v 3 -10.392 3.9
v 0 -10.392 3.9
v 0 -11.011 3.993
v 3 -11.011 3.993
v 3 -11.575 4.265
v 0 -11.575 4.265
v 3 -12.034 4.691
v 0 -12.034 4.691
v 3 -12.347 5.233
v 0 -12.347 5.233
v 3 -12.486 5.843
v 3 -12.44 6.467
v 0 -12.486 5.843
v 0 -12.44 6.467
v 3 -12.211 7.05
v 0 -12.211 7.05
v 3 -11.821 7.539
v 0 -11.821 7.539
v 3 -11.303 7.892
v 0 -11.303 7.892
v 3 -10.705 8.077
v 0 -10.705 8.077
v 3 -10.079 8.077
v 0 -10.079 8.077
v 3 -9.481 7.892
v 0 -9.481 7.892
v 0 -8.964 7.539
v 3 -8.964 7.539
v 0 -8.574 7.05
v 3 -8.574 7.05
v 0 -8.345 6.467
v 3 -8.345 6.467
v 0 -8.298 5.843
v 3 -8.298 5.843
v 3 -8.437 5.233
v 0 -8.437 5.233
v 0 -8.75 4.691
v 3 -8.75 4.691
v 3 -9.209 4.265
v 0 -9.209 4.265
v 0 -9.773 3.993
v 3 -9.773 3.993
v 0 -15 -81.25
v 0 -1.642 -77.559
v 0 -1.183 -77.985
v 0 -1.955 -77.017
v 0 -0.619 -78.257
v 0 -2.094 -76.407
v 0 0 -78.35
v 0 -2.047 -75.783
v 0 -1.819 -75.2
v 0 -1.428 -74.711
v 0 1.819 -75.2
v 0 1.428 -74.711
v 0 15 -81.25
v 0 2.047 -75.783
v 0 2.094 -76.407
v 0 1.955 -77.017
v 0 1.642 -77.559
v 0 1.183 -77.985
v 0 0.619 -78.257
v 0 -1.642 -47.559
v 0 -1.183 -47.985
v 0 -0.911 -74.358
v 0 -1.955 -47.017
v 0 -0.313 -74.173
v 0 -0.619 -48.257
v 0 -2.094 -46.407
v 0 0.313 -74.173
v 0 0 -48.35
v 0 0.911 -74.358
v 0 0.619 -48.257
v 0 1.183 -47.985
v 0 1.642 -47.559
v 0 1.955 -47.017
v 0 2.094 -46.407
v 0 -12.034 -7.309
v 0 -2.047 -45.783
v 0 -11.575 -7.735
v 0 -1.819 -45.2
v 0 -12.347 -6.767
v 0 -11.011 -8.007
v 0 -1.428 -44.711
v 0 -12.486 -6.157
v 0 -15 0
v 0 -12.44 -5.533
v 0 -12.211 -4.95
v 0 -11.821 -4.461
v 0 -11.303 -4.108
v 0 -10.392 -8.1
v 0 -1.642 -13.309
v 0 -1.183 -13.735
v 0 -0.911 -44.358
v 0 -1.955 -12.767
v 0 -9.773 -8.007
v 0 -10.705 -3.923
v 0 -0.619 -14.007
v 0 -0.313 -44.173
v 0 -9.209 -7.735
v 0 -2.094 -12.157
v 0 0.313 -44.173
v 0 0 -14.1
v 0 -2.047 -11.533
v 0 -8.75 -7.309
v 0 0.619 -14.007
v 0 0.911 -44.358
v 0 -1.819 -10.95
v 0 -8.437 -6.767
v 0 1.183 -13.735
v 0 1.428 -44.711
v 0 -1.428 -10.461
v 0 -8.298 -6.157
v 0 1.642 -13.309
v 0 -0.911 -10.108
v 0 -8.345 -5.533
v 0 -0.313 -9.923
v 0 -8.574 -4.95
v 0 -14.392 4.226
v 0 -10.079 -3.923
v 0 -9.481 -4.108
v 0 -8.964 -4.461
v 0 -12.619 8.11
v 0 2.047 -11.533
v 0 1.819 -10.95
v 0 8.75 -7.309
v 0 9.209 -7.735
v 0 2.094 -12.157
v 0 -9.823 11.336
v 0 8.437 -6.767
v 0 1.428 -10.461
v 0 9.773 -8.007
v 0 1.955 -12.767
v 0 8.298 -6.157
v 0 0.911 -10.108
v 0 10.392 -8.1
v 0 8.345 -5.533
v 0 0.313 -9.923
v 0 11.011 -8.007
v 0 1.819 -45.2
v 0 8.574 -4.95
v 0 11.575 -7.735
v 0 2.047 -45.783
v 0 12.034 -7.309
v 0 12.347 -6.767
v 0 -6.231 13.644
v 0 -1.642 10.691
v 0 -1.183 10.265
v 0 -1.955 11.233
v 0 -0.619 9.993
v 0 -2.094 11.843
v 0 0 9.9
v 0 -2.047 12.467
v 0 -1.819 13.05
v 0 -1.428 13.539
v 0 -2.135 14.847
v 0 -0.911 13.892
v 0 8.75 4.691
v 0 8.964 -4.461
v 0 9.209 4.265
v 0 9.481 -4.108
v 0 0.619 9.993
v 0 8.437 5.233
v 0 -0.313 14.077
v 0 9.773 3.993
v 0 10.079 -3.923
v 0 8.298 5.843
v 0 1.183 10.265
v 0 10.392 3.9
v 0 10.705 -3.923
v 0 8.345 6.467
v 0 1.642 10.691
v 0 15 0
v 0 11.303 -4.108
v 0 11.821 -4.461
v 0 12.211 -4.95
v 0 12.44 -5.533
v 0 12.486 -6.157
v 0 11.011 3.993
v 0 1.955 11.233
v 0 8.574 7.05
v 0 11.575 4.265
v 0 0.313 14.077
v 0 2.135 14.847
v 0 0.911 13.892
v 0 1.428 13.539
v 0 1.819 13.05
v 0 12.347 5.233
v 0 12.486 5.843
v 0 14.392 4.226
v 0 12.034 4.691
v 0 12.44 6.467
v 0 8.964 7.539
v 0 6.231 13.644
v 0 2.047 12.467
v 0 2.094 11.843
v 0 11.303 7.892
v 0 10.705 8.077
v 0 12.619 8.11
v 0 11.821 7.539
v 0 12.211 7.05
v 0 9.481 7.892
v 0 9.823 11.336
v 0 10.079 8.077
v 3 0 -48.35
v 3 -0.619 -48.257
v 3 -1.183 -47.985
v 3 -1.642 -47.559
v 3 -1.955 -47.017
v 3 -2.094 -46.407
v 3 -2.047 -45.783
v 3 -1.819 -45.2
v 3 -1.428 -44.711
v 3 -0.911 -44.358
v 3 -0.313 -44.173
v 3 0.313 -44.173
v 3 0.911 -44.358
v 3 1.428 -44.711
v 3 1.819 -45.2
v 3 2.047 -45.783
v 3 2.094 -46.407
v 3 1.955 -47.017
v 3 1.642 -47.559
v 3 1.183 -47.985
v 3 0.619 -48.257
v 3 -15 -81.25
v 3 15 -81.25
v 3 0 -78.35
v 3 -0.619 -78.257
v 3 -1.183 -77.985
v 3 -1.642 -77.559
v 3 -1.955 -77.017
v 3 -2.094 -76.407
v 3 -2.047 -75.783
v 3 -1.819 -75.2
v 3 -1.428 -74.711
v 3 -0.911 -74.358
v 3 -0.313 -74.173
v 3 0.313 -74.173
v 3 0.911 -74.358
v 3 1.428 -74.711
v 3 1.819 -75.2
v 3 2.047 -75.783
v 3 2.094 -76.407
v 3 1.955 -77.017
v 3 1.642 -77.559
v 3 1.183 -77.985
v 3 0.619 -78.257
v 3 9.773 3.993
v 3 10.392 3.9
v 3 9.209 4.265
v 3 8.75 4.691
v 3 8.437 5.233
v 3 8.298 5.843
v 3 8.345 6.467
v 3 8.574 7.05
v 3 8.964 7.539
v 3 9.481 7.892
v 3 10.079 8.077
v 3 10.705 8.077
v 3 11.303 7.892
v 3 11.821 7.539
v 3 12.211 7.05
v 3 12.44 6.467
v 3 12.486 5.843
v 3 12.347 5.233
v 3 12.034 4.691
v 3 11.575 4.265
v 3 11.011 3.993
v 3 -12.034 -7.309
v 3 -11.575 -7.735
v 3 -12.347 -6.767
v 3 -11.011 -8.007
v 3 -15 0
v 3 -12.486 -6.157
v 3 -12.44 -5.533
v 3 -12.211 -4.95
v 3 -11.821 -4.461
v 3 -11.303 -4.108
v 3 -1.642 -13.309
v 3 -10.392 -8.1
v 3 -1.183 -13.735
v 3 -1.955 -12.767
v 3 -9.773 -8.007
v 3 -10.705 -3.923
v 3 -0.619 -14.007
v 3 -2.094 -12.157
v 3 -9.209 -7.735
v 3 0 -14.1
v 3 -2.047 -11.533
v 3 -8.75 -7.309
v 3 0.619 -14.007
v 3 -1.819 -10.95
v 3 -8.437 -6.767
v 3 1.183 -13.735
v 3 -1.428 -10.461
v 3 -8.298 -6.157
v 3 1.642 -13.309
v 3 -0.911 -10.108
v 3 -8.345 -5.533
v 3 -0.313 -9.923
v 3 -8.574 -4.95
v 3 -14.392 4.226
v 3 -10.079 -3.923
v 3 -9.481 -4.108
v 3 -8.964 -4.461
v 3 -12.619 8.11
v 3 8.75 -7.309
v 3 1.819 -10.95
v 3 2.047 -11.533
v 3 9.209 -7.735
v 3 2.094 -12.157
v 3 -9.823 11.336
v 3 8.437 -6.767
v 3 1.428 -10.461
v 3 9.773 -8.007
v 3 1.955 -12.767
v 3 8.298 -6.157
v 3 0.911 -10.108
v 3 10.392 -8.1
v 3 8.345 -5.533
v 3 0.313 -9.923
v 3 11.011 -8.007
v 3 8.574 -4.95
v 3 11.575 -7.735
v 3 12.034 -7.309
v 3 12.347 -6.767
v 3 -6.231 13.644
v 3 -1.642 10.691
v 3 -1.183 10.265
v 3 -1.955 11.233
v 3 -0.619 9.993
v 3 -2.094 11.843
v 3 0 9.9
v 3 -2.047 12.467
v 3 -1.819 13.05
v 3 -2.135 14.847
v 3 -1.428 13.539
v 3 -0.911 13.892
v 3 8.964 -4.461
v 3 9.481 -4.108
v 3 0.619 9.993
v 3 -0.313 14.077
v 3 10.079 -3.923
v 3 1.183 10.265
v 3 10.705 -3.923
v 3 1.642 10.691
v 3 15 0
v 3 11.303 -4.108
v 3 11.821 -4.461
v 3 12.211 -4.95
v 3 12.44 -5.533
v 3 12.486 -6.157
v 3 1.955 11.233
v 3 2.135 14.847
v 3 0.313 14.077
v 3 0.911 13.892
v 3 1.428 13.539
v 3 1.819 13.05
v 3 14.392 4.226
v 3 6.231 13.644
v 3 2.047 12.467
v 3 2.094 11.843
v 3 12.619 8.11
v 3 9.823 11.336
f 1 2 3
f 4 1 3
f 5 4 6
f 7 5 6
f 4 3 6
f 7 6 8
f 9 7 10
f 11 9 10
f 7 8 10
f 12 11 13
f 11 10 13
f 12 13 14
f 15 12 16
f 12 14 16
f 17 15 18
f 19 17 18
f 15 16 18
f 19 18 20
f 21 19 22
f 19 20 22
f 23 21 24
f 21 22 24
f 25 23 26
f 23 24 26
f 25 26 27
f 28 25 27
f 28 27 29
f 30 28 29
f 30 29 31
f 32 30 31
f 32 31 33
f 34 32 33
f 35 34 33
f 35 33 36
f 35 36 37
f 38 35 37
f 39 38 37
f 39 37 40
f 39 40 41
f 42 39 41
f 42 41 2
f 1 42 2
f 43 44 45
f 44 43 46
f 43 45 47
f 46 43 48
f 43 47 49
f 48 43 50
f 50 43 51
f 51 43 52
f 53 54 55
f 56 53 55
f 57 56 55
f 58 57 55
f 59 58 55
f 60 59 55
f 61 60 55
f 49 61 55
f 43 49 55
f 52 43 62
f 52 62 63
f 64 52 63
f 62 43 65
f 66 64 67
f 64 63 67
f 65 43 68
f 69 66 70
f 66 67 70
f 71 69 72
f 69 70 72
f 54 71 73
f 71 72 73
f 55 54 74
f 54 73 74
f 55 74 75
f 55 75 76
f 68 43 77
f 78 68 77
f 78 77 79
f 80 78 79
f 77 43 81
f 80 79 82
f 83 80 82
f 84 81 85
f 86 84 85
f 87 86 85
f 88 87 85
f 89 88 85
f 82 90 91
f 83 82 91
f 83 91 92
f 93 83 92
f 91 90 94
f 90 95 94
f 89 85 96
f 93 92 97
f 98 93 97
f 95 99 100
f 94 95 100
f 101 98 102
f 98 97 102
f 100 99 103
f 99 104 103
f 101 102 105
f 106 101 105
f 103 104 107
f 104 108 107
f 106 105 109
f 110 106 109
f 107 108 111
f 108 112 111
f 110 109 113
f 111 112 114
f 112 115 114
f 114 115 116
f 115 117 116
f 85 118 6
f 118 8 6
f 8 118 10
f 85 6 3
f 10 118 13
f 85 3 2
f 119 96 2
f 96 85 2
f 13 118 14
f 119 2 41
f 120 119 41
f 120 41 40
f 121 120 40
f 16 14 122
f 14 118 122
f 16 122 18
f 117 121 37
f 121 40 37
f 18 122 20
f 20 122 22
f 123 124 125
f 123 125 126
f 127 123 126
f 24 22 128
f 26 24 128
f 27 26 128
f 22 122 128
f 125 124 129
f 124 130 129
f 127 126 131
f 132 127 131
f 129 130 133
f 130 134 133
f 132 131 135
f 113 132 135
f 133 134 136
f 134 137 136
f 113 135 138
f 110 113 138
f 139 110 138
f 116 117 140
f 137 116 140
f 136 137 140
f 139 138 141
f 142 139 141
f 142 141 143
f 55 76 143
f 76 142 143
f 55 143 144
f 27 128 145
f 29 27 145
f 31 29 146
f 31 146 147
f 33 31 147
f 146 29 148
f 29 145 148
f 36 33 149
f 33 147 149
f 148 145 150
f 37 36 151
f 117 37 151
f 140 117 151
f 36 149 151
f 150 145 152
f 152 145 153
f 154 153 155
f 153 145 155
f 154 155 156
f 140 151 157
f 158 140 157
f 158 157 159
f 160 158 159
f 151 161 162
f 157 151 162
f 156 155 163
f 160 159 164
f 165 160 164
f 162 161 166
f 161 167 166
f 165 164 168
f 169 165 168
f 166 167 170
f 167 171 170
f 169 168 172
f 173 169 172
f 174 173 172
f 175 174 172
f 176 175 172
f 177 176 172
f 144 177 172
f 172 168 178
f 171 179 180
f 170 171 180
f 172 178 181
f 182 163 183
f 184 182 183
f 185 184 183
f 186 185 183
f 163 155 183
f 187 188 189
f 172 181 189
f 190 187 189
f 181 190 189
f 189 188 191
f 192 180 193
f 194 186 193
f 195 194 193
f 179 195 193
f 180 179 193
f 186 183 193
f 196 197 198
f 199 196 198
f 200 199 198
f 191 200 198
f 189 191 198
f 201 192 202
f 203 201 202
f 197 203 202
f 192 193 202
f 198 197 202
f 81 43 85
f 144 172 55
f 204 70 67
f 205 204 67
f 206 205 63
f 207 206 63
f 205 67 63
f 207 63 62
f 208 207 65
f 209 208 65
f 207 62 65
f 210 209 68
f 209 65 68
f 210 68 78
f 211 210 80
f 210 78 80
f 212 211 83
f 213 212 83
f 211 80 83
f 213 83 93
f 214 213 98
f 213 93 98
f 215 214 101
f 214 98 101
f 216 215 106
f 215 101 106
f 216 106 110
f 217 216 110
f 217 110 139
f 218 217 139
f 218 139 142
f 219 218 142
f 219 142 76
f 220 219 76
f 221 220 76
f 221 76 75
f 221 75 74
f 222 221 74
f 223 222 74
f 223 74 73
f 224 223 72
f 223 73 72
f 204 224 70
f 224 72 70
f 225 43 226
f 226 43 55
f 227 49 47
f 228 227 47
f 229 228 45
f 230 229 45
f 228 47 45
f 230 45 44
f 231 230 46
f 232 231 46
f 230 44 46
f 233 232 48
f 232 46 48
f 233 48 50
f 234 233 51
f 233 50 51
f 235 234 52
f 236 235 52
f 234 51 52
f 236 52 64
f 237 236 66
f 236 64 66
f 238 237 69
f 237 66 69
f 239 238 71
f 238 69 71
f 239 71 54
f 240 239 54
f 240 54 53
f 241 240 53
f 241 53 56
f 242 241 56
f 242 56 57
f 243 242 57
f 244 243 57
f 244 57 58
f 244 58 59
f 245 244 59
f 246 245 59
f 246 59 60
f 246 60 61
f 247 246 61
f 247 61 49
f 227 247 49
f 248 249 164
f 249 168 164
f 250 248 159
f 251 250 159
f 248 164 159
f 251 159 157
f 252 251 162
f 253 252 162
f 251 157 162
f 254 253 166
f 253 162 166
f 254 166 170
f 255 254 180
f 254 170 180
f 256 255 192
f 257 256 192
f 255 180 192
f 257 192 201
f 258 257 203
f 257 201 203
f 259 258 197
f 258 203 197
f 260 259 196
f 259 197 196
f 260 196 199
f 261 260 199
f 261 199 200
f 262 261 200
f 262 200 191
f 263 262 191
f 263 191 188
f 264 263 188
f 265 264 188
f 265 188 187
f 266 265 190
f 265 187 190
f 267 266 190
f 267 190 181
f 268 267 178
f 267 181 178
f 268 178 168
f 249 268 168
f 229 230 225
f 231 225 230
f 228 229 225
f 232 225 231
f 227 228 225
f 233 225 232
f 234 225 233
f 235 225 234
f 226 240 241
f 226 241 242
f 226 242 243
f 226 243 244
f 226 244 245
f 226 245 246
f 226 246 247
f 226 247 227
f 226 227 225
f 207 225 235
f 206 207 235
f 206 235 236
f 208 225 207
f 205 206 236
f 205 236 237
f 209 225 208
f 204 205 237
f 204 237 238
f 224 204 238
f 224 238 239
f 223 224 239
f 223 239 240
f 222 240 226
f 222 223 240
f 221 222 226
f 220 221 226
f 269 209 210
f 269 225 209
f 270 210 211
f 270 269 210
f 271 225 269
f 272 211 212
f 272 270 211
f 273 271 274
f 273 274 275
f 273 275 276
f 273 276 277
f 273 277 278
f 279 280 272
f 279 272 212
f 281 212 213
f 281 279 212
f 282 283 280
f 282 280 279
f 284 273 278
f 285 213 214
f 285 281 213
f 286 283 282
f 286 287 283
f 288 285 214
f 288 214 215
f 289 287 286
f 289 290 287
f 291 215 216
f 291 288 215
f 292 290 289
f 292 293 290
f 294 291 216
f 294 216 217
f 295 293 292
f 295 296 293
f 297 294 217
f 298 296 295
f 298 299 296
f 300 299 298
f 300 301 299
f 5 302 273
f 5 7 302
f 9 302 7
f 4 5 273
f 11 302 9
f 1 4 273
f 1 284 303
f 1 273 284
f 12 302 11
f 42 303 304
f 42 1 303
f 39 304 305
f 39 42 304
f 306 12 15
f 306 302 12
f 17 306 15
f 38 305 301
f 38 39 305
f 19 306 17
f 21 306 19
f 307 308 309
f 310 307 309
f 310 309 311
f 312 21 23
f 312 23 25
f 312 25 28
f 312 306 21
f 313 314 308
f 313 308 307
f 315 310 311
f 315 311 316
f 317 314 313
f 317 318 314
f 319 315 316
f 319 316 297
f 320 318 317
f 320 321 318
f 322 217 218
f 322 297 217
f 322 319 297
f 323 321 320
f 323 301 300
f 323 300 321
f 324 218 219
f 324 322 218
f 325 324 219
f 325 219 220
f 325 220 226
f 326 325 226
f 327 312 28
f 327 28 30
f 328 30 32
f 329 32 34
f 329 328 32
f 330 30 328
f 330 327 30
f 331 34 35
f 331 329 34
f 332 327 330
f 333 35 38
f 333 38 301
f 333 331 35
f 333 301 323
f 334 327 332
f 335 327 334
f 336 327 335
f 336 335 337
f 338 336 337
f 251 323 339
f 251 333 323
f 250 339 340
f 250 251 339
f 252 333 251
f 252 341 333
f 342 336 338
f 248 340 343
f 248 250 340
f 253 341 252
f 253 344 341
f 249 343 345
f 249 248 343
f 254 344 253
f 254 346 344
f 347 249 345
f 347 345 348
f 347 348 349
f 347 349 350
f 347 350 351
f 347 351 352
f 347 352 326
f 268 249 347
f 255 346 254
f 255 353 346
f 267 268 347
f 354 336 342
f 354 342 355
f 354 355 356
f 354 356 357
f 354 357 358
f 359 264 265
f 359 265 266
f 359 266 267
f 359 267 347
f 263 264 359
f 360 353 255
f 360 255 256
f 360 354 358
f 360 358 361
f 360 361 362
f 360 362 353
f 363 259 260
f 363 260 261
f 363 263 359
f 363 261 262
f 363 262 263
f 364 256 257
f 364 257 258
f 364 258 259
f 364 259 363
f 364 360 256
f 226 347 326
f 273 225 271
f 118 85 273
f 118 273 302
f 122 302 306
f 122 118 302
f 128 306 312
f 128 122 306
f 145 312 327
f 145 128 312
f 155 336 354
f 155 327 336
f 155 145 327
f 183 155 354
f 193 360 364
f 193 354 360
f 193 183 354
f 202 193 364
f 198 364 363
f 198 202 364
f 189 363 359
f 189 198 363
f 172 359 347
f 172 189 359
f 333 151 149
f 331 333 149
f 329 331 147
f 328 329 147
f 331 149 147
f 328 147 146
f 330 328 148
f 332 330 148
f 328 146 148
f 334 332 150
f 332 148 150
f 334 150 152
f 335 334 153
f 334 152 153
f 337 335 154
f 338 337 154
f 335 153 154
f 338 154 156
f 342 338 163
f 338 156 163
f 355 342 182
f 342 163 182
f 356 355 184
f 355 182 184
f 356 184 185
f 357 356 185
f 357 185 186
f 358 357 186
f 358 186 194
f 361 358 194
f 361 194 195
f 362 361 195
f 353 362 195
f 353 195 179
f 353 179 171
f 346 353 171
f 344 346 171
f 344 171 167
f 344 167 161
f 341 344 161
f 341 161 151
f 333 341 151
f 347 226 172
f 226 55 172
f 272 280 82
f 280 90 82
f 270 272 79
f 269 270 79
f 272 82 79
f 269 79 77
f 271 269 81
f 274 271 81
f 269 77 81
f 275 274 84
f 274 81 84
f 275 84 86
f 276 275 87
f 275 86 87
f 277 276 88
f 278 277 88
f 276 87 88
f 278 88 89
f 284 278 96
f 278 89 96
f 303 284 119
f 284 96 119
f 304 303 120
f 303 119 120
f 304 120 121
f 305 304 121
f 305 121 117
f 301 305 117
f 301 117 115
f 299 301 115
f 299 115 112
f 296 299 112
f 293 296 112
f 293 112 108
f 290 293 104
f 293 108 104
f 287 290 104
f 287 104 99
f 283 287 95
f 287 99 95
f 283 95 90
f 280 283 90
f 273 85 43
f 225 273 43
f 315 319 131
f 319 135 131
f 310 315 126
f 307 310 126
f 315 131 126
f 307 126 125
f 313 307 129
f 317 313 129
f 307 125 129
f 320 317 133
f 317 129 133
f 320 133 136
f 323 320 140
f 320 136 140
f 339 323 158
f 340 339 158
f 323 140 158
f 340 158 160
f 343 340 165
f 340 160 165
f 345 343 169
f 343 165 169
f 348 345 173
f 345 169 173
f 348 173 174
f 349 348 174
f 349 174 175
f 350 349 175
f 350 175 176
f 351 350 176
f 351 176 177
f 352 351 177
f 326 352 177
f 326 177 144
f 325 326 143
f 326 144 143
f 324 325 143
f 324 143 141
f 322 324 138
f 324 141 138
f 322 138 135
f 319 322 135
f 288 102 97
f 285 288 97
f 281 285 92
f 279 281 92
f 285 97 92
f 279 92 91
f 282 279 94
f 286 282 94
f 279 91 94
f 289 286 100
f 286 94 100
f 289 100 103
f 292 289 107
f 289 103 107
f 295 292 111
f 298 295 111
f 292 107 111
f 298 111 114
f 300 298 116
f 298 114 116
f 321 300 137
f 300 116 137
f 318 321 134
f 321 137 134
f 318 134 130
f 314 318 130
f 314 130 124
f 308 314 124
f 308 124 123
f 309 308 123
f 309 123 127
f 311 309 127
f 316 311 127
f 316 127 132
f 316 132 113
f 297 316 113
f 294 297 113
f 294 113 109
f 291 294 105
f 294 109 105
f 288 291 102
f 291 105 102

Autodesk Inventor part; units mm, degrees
ref_plane "YZ Plane" through (0, 0, 0) normal (1, 0, 0) x (0, 1, 0)
ref_plane "XZ Plane" through (0, 0, 0) normal (0, 1, 0) x (-1, 0, 0)
ref_plane "XY Plane" through (0, 0, 0) normal (0, 0, 1) x (1, 0, 0)
sketch "スケッチ1" plane through (0, 0, 0) normal (1, 0, 0) x (0, 1, 0)
  circle A0 centre (0, 0) radius 15
  line L0 (15, -41.25) -> (-15, -41.25)
  line L1 (-15, -41.25) -> (-15, -81.25)
  line L2 (-15, -81.25) -> (15, -81.25)
  line L3 (15, -81.25) -> (15, -41.25)
  line L4 (15, -41.25) -> (15, 0)
  line L5 (-15, 0) -> (-15, -41.25)
  dimension "d0" = 30
  dimension "d1" = 30
  dimension "d2" = 40
  dimension "d4" = 15
  dimension "d28" = 41.25
extrude "押し出し1" add sketch "スケッチ1" along normal blind 3
sketch "スケッチ2" plane through (3, 0, 0) normal (1, 0, 0) x (0, 0, -1)
  circle A0 centre (0, 0) radius 12
  line L0 (81.25, 15) -> (0, 15) projected
  line L1 (81.25, -15) -> (81.25, 15) projected
  point P0 (12, 0)
  point P1 (6, 10.3923)
  point P2 (-6, 10.3923)
  point P3 (-12, 0)
  point P4 (-6, -10.3923)
  point P5 (6, -10.3923)
  dimension "d7" = 24
  dimension "d10" = 360
hole "穴1" at (3, 0, -12) at (3, 10.3923, -6) at (3, 10.3923, 6) at (3, 0, 12) at (3, -10.3923, 6) at (3, -10.3923, -6) direction (-1, 0, 0) diameter 4.2 end through all
sketch "スケッチ5" plane through (3, 0, 0) normal (1, 0, 0) x (0, 0, -1)
  line L0 (81.25, -15) -> (81.25, 15) projected
  point P0 (0, 0)
  point P1 (76.25, 0)
  point P2 (46.25, 0)
  dimension "d40" = 5
  dimension "d41" = 30
hole "穴3" at (3, 0, -76.25) at (3, 0, -46.25) direction (-1, 0, 0) diameter 4.2 end through all
properties part number "link4_plate4" material "アルミニウム 6061"
